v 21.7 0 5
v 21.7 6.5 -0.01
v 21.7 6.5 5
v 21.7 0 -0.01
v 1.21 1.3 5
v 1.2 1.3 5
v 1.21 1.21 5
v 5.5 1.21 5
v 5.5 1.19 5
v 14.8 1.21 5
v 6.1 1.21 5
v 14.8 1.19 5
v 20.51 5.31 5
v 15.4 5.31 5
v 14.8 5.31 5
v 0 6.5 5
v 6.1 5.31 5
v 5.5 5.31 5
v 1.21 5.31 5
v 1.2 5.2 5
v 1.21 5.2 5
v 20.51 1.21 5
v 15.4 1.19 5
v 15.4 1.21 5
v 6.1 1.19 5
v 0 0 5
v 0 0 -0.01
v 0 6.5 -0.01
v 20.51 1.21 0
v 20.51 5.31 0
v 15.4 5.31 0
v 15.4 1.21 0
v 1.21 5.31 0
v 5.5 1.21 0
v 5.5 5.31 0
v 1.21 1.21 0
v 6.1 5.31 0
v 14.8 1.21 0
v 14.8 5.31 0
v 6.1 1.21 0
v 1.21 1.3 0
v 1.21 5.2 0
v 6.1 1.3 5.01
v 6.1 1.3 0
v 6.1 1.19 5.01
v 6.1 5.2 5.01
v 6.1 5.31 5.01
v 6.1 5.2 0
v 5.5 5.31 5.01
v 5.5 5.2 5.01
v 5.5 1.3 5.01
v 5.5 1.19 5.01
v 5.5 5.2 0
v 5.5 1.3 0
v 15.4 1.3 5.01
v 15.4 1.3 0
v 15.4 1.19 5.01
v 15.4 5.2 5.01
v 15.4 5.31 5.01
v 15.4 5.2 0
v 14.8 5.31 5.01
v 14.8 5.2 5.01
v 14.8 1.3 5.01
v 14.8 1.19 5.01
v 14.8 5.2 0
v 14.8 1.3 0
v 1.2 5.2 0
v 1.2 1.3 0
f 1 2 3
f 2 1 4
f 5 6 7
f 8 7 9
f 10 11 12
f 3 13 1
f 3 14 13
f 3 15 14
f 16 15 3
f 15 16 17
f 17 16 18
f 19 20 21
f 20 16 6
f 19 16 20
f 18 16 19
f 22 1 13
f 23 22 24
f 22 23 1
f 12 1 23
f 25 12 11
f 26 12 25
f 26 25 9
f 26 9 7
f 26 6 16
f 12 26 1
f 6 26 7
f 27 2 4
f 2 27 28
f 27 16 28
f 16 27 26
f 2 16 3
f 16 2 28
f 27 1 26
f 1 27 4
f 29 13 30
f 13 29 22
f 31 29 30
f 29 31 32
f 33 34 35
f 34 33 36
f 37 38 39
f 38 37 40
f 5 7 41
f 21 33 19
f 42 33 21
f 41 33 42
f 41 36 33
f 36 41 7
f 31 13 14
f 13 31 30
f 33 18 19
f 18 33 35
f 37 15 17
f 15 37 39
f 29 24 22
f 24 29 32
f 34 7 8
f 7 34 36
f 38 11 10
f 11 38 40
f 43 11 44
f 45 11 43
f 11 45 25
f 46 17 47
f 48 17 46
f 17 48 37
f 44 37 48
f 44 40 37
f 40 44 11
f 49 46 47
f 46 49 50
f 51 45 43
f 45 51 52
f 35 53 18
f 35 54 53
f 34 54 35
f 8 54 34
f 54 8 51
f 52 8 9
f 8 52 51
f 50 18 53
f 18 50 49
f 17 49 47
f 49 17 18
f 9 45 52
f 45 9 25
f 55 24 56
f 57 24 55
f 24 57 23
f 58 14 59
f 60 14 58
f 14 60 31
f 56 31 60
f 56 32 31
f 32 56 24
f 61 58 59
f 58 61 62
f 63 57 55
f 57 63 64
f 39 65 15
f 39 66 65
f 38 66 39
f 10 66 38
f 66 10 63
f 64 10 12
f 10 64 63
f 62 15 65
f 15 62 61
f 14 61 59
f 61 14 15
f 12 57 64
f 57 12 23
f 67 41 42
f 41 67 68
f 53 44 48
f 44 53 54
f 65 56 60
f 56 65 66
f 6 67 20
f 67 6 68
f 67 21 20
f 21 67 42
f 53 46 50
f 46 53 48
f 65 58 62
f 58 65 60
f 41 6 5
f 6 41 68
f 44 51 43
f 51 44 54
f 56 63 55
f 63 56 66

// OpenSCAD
// file: ../Base/Rotation.scad
// Fischertechnik Box Foundation
// Geometry Helpers Rotation

include <PlacementOptions.scad>

// getRotatedSpace(space, rotation=NoRotation)
// Rotates the space dependent on the specified rotation

function getRotatedSpace(space, rotation=NoRotation) = [
    (rotation == Rotate90 || rotation == Rotate270) ? space.y : space.x,
    (rotation == Rotate90 || rotation == Rotate270) ? space.x : space.y
];

// Rotates the given space around the fixed left lower corner
// space = the space the children needs as width/depth list [width,depth]
// rotation = 0 Rotate0 degrees, 1 Rotate90 degrees, 2 Rotate180 degrees, 3 Rotate270 degrees (equivalent to -90)

module RotateFix(space, rotation=NoRotation) {
    dy = (rotation == Rotate0 || rotation == Rotate270) ? 0 :
        (rotation == Rotate90) ? space.x :
        space.y;
    dx = (rotation < Rotate180) ? 0 :
        (rotation == Rotate180) ? space.x :
        space.y;
    
    translate([dx, dy, 0])
        rotate([0, 0, rotations[rotation]])
            children();
}
// file: ../Base/Alignment.scad
// Fischertechnik Box Foundation
// Geometry Helpers Alignment

include <PlacementOptions.scad>

// getAlignedX(elementWidth, spaceWidth, align=AlignRight, offset=0)
// Gets the aligned X offset of an element with the given
// width in the given space.
// elementWidth = The width of the element to positon
// spaceWidth = The space where the element should be aligned
// align = 0 AlignLeft, 1 AlignCenter, 2 AlignRight
// offset = an optional offset from the aligned position. When
// aligned left or centered, then positive values are in X direction.
// When aligned right then positive values are in negative X direction.

function getAlignedX(elementWidth, spaceWidth, align=AlignRight, offset=0) =
    (align == AlignLeft) ?
        offset :
        ((align == AlignCenter) ?
        (spaceWidth - elementWidth)/2 + offset :
        spaceWidth - offset - elementWidth);

// getAlignedY(elementDepth, spaceDepth, align=AlignTop, offset=0)
// Gets the aligned Y offset of an element with the given
// depth in the given space.
// elementDepth = The depth of the element to positon
// spaceDepth = The space where the element should be aligned
// align = 0 AlignBottom, 1 AlignCenter, 2 AlignTop
// offset = an optional offset from the aligned position. When
// aligned bottom or centered, then positive values are in Y direction.
// When aligned top then positive values are in negative Y direction.

function getAlignedY(elementDepth, spaceDepth, align=AlignTop, offset=0) =
    (align == AlignBottom) ?
        offset :
        ((align == AlignCenter) ?
        (spaceDepth - elementDepth)/2 + offset :
        spaceDepth - offset - elementDepth);
// file: ../Base/PlacementOptions.scad
// Fischertechnik Box Foundation
// Placement Options

// Alignment
NoAlign = 0;
AlignLeft = 1;
AlignBottom = 2;
AlignCenter = 3;
AlignRight = 4;
AlignTop = 5;

// Element rotation degree steps
rotations = [0, -90, -180, -270];

// Rotation
NoRotation = 0;
Rotate0 = 0;
Rotate90 = 1;
Rotate180 = 2;
Rotate270 = 3;

// Docking (seen from above)
NoDock = -1;
DockLeft = 0;
DockTop = 1;
DockRight = 2;
DockCorner = 2;
DockBottom = 3;

// Web corners
LowerLeft = 0;
UpperLeft = 1;
UpperRight = 2;
LowerRight = 3;

// Web position relative to corner
LeftOfCorner = 0;
RightOfCorner = 1;

// Rails direction
Horizontal = true;
Vertical = false;
// file: ../Base/Boxes.scad
// Fischertechnik Box Foundation
// Pre-designed Boxes

use <Constants.scad>

include <PlacementOptions.scad>

box190Width = 190;
box190Depth = 130;
box130Width = 130;
box130Depth = 95;

// Values are from an original ec3 box
topBottomDifference = 1.5;
outerHeight = 40;
baseThickness = 1.8;
innerHeight = outerHeight - baseThickness;
stackExcess = 5.7;
radius = 3.5;
wallThickness = 1.5;
tolerance = 0.2;

boxWallThickness = wallThickness;
boxBaseThickness = baseThickness;
boxWebWidth = 3.0;

// getBoxWallThickness()
// Gets the wall thickness of a Fischertechnik Box
function getBoxWallThickness() = boxWallThickness;

// getBoxUsageHeight(height = 38.2)
// Gets the usable height of a Fischertechnik box
// height = Outer height of the box from the bottom to the upper edge.
function getBoxUsageHeight(height = outerHeight) = height - baseThickness - stackExcess;

// getBoxInnerHeight()
// Gets the inner height of a Fischertechnik box, including the stack excess
function getBoxInnerHeight() = innerHeight;

// getBoxBaseThickness()
// Gets the thickness of the Fischertechnik box base.
function getBoxBaseThickness() = boxBaseThickness;

// getBoxWebWidth()
// Gets the width of a box web
function getBoxWebWidth() = boxWebWidth;

// getBox190Space()
// Gets the usable inner space of a Box 190 as an x/y-list
function getBox190Space() = [
    box190Width - 2*getBoxWallThickness() - topBottomDifference, 
    box190Depth - 2*getBoxWallThickness() - topBottomDifference ];

// RoundedCornerPlate(width, depth, height, radius)
// Creates a body plate with rounded corners for a box. Used
// also to create the complete box with the hull module.
// width = Width of the plate
// depth = depth of the plate 
// height = thickness of the plate
// radius = radius of the rounded corner
module RoundedCornerPlate(width, depth, height, radius) {
    translate([radius, radius])
    hull() {
        w = width-2*radius;
        d = depth-2*radius;
        cube([w, d, height]);
        cylinder(height, r=radius, $fn=getFragments());
        translate([w, 0])
            cylinder(height, r=radius, $fn=getFragments());
        translate([w, d])
            cylinder(height, r=radius, $fn=getFragments());
        translate([0, d])
            cylinder(height, r=radius, $fn=getFragments());
    }
}

// BoxBase(width, depth)
// Creates an empty stackable Fischertechnik compatible box
// width = Outer width of the box (190, 130, ...)
// depth = Outer depth of the box (130, 95, ...)

module BoxBase(width, depth, height=outerHeight) {    
    thinPlate = 0.01;

    innerHeight = height - baseThickness;    
    
    module Body(tolerance=tolerance) {
        hull() {
            // Bottom with tolerance to fit into the original boxes when stacked
            translate([-wallThickness+tolerance, -wallThickness+tolerance, -baseThickness])
                RoundedCornerPlate(width-topBottomDifference-2*tolerance, depth-topBottomDifference-2*tolerance, thinPlate, radius);
            
            // Top
            translate([-wallThickness-topBottomDifference/2, -wallThickness-topBottomDifference/2, innerHeight-thinPlate])
                RoundedCornerPlate(width, depth, thinPlate, radius);
         }
    }

    module Cutoff() {
        hull() {
            coWidth = width - 2*wallThickness;
            coDepth = depth - 2*wallThickness;
            
            // Bottom
            RoundedCornerPlate(coWidth-topBottomDifference, coDepth-topBottomDifference, thinPlate, radius);

            // Top
            translate([-topBottomDifference/2, -topBottomDifference/2, innerHeight+thinPlate]) 
                RoundedCornerPlate(coWidth, coDepth, thinPlate, radius);
        }
    }
    
    difference() {        
        Body();
        Cutoff();
        stackOffset = innerHeight - stackExcess;
        translate([0, 0, stackOffset + baseThickness])
            Body(tolerance=0);
    }
}

// Creates the Fischertechnik empty box 130x190 mm and places it at position 0,0
// 190x130 are the outer sizes, the inner space is slightly smaller. Use getBox190Space() to get the inner sizes.
// The box is positioned that the usable inner space is at the 0,0,0 position.

module Box190() {
    BoxBase(box190Width, box190Depth);
}

// Gets the usable inner space of a Box 130 as an x/y-list
function getBox130Space() = [
    box130Width - 2*getBoxWallThickness() - topBottomDifference, 
    box130Depth - 2*getBoxWallThickness() - topBottomDifference ];

// Creates the Fischertechnik empty box 95x130 mm and places it at position 0,0
// 190x130 are the outer sizes, the inner space is slightly smaller. Use getBox190Space() to get the inner sizes.
// The box is positioned that the usable inner space is at the 0,0,0 position.

module Box130() {
    BoxBase(box130Width, box130Depth);
}

// Creates a web at the specified box walls
// corner 0 = LowerLeft, 1 = UpperLeft, 2 = UpperRight, 3 = LowerRight
// side 0 = LeftOfCorner, 1 = RightOfCorner
// distance = Distance in mm from the corner
// boxSpace = inner width and depth of the box (default: Box 190)
// webWidth = length of the web (default is 3 mms)
// webThickness = thickness of the web (default is 1 mm)
// height = Height of the web (standard is getBoxUsageHeight())
// sink = How much of the web is sunk into the wall

module BoxWeb(
    corner, 
    side, 
    distance, 
    boxSpace=getBox190Space(), 
    webWidth=getBoxWebWidth(), 
    webThickness=1.0, 
    height=getBoxUsageHeight(),
    sink = getBoxWallThickness()/2) {
    width = (corner % 2 == 0) ? 
            (side == LeftOfCorner ? webWidth : webThickness) :
            (side == LeftOfCorner ? webThickness : webWidth);

    depth = (corner % 2 == 0) ? 
            (side == RightOfCorner ? webWidth : webThickness) :
            (side == RightOfCorner ? webThickness : webWidth);
    
    xDiff = corner == LowerLeft ? 
                (side == LeftOfCorner ? -sink : distance) :
            (corner == UpperLeft ?                
                (side == LeftOfCorner ? distance : -sink) :
            (corner == UpperRight ?
                (side == LeftOfCorner ? boxSpace.x-webWidth+sink : boxSpace.x-distance-webThickness) :
                (side == LeftOfCorner ? boxSpace.x-distance-webThickness: boxSpace.x-webWidth+sink)));

    yDiff = corner == LowerLeft ? 
                (side == RightOfCorner ? -sink : distance) :
            (corner == UpperLeft ?
                (side == RightOfCorner ? boxSpace.y-distance-webThickness : boxSpace.y-webWidth+sink) :
            (corner == UpperRight ?
                (side == RightOfCorner ? boxSpace.y-webWidth+sink : boxSpace.y-distance-webThickness) :
                (side == RightOfCorner ? distance : -sink)));
    
    translate([xDiff, yDiff, -getExcess()])
        cube([width, depth, height + 2*getExcess()]);
}
// file: ../Base/Placement.scad
// Fischertechnik Box Foundation
// Geometry Helpers Placement

use <Constants.scad>
use <Alignment.scad>
use <Rotation.scad>
use <Boxes.scad>

include <PlacementOptions.scad>

// Place(x=0, y=0, elementSpace=[0,0], alignX=AlignLeft, alignY=AlignBottom, rotation=Rotate0, boxSpace=getBox190Space())
// Places the child at the specified position
// y = Y-Position. This is a relative position when an X aligment is specified.
// x = X-Position. This is a relative position when an Y aligment is specified.
// elementSpace = space of the element to be placed [x,y]
// alignX = -1=NoAlign, 0 AlignLeft, 1 AlignCenter, 3 AlignRight (elementSpace and boxSpace required!)
// alignY = -1=NoAlign, 2 AlignBottom, 1 AlignCenter, 4 AlignTop (elementSpace and boxSpace required!)
// rotation = 0 Rotate0 0 degrees, 1 Rotate90 90 degrees, 
// 2 Rotate180 180 degrees, 3 Rotate270 270 degrees (equivalent to -90)
// boxSpace = Inner space of the box where the placement occurs [x,y] - default is Box 190x130 inner space

module Place(x=0, y=0, elementSpace=[0,0], 
  alignX=AlignLeft, alignY=AlignBottom, 
  rotation=NoRotation, boxSpace=getBox190Space()) {

    module Position(x, y, space, rotation=Rotate0) {
        translate([x, y, 0])
            RotateFix(space, rotation)
                children();
    }

    space = getRotatedSpace(elementSpace, rotation);
    alignedX = getAlignedX(space.x, boxSpace.x, alignX, x);
    alignedY = getAlignedY(space.y, boxSpace.y, alignY, y);
    Position(alignedX, alignedY, elementSpace, rotation)
        children();
}

// Center(space=getBox130Space(), elementSpace=[0,0])
// space = Space where the children is centered. For cylinder use centered=true and no elementSpace.
// elementSpace = space of the element to be centered [x,y]

module Center(space=getBox190Space(), elementSpace=[0,0]) {
    Place(elementSpace=elementSpace, boxSpace=space, alignX=AlignCenter, alignY=AlignCenter)
        children();
}

// CenterHorizontal(width=0, y=0, offset=0, space=getBox130Space())
// width = Width of the element to be placed.
// y = Y position of the element
// offset = Offset from the center position (negative will be left of the center)
// space = Space where the element is placed

module CenterHorizontal(width=0, y=0, offset=0, space=getBox190Space()) {
    Place(x=offset, y=y, elementSpace=[width, 0], boxSpace=space, alignX=AlignCenter)
        children(0);
}

// CenterVertical(depth=0, x=0, offset=0, space=getBox130Space())
// depth = Depth of the element to be placed.
// x = X position of the element
// offset = Offset from the center position (negative will be down of the center)
// space = Space where the element is placed

module CenterVertical(depth=0, x=0, offset=0, space=getBox190Space()) {
    Place(x=x, y=offset, elementSpace=[0, depth], boxSpace=space, alignY=AlignCenter)
        children(0);
}

// getIsVertical(align)
// True if the specified alignment needs a vertical orientation for a divider (AlignRight, AlignLeft)

function getIsVertical(align) = (align == AlignRight || align == AlignLeft);

// getIsHorizontal(align)
// True if the specified alignment needs a horizontal orientation for a divider (AlignTop, AlignBottom)

function getIsHorizontal(align) = (align == AlignTop || align == AlignBottom);
// file: ../Base/Constants.scad
// Fischertechnik Box Foundation
// Constants

// Constant values necessary for multiple elements

// Base constants
dividerThickness = 1.2;
excess = 0.01;
fragments = 90;
tolerance = 0.8;

// Gets the thickness of a divider 
function getDividerThickness() = dividerThickness;

// Gets the excess that is used to merge walls into each other
function getExcess() = excess;

// Gets amount of fragments of a cylinder
function getFragments() = fragments;

// Gets the inner tolerance of a frame to each side
function getTolerance() = tolerance;


// Fischertechnik specific constants
axisDiameter = 4;
axisBottomDiameter = axisDiameter + 1;
axisTolerance = 0.2;
axisLockingLength = 8;

// Gets axis diameter of Fischertechnik axis
function getAxisDiameter() = axisDiameter;

// Gets axis diameter tolerance (subtracted for element axis)
function getAxisTolerance() = axisTolerance;

// Gets the axis diameter for standing axis
function getStandAxisDiameter() = getAxisDiameter() - getAxisTolerance();

// Gets axis bottom diameter for thicker part at the bottom
function getAxisBottomDiameter() = axisBottomDiameter;

// Gets the lengthh of the locking part of a locking axis
function getAxisLockingLength() = axisLockingLength;

// Studs

studHeight = 2.5;
studTolerance = 0.2;
studRailDistance = 9;   // as in ft 50

// gets the height of a connecting stud
function getStudHeight() = studHeight;

// gets the connecting stud height tolerance
function getStudTolerance() = studTolerance;

// gets the default rail distance for studs
function getStudRailDistance() = studRailDistance;

// Dockable Frame with Edge

standardEdgeDistance = 2.5;
standardWebDistance = 11.5;
standardCornerLength = 15;

// gets the standard distance to the wall of the box for dockable frames with webs
function getStandardEdgeDistance() = standardEdgeDistance;

// gets the standard distance of each web to the corner of the dockable frame
function getStandardWebDistance() = standardWebDistance;

// gets the standard length of the corner walls of a dockable frame
function getStandardCornerLength() = standardCornerLength;

// Tubes

tubeWallFactor = 0.8;

// gets the wall thickness of a tube.
function getTubeWallThickness() = tubeWallFactor * getDividerThickness();

// Small Parts and Divider Frame

smallPartsFrameHeight = 20;

// gets the frame height for docked small parts boxes.
function getSmallPartsFrameHeight() = smallPartsFrameHeight;

// Hubs

hubRingDiameter = 19.5;
hubRingLevelDiameter = 21;

// gets the diameter of a tube matching the inner ring of a wheel
function getHubRingDiameter() = hubRingDiameter;

// gets the diameter of a hub tube with a thicker diameter
function getHubRingLevelDiameter() = hubRingLevelDiameter;

// Struts

strutAddLength = 9.0;
strutDepth = 8.0;

// gets the full length of a strut
function getFullStrutLength(length) = length + strutAddLength;

// gets the radius of the end of a strut
function getStrutEndRadius() = strutAddLength / 2;

// gets the the depth of a strut
function getStrutDepth() = strutDepth;

// Propeller

propellerAxisDiameter = 7.0;
propellerAxisTolerance = 0.2;

// gets the propeller axis outer diameter
function getPropellerAxisDiameter() = propellerAxisDiameter;

// gets the propeller axis printing tolerance
function getPropellerAxisTolerance() = propellerAxisTolerance;
// main file
// Fischertechnik Box Library
// Frame for Electronic Block Connector
// 36380

use <../Base/Constants.scad>
use <../ModelBase/Simple.scad>

/* [Hidden] */
width = 18.5;
depth = 3.3;
height = 5;
tolerance = 0.8;

// getFrameElectronicBlockConnectorSpace()
// Gets the space the frame for electronic block conector needs as width and depth (.x and .y as a list)

function getFrameElectronicBlockConnectorSpace() = 
    getFrameOuterVolume([width, depth, height], tolerance = tolerance);

// FrameElectronicBlockConnector()
// Frame for electronic block connector

module FrameElectronicBlockConnector() {    
    webThickness = 0.6;
    webDepth = 0.1;
    webDistance = 4.3;
    innerVolume = getFrameInnerVolume([width, depth, height], tolerance = tolerance);
    
    module InnerFrame() {
        Frame([width, depth, height], tolerance = tolerance);
        
        translate([0, getDividerThickness()-getExcess(), -getExcess()]) {
            translate([getDividerThickness()+webDistance, 0])
                cube([webThickness, innerVolume.y+2*getExcess(), innerVolume.z+getExcess()]);
            translate([getDividerThickness()+width-webDistance-webThickness, 0])
                cube([webThickness, innerVolume.y+2*getExcess(), innerVolume.z+getExcess()]);
        }
    }

    difference() {
        InnerFrame();

        cutoffWidth = innerVolume.x;
        cutoffDepth = innerVolume.y - 2*webDepth;
        
        translate([getDividerThickness(), getDividerThickness() + webDepth, 0])
            cube([cutoffWidth, cutoffDepth, height+1]);
    }
}

// Test
color("lightgray") {
    FrameElectronicBlockConnector();
}
